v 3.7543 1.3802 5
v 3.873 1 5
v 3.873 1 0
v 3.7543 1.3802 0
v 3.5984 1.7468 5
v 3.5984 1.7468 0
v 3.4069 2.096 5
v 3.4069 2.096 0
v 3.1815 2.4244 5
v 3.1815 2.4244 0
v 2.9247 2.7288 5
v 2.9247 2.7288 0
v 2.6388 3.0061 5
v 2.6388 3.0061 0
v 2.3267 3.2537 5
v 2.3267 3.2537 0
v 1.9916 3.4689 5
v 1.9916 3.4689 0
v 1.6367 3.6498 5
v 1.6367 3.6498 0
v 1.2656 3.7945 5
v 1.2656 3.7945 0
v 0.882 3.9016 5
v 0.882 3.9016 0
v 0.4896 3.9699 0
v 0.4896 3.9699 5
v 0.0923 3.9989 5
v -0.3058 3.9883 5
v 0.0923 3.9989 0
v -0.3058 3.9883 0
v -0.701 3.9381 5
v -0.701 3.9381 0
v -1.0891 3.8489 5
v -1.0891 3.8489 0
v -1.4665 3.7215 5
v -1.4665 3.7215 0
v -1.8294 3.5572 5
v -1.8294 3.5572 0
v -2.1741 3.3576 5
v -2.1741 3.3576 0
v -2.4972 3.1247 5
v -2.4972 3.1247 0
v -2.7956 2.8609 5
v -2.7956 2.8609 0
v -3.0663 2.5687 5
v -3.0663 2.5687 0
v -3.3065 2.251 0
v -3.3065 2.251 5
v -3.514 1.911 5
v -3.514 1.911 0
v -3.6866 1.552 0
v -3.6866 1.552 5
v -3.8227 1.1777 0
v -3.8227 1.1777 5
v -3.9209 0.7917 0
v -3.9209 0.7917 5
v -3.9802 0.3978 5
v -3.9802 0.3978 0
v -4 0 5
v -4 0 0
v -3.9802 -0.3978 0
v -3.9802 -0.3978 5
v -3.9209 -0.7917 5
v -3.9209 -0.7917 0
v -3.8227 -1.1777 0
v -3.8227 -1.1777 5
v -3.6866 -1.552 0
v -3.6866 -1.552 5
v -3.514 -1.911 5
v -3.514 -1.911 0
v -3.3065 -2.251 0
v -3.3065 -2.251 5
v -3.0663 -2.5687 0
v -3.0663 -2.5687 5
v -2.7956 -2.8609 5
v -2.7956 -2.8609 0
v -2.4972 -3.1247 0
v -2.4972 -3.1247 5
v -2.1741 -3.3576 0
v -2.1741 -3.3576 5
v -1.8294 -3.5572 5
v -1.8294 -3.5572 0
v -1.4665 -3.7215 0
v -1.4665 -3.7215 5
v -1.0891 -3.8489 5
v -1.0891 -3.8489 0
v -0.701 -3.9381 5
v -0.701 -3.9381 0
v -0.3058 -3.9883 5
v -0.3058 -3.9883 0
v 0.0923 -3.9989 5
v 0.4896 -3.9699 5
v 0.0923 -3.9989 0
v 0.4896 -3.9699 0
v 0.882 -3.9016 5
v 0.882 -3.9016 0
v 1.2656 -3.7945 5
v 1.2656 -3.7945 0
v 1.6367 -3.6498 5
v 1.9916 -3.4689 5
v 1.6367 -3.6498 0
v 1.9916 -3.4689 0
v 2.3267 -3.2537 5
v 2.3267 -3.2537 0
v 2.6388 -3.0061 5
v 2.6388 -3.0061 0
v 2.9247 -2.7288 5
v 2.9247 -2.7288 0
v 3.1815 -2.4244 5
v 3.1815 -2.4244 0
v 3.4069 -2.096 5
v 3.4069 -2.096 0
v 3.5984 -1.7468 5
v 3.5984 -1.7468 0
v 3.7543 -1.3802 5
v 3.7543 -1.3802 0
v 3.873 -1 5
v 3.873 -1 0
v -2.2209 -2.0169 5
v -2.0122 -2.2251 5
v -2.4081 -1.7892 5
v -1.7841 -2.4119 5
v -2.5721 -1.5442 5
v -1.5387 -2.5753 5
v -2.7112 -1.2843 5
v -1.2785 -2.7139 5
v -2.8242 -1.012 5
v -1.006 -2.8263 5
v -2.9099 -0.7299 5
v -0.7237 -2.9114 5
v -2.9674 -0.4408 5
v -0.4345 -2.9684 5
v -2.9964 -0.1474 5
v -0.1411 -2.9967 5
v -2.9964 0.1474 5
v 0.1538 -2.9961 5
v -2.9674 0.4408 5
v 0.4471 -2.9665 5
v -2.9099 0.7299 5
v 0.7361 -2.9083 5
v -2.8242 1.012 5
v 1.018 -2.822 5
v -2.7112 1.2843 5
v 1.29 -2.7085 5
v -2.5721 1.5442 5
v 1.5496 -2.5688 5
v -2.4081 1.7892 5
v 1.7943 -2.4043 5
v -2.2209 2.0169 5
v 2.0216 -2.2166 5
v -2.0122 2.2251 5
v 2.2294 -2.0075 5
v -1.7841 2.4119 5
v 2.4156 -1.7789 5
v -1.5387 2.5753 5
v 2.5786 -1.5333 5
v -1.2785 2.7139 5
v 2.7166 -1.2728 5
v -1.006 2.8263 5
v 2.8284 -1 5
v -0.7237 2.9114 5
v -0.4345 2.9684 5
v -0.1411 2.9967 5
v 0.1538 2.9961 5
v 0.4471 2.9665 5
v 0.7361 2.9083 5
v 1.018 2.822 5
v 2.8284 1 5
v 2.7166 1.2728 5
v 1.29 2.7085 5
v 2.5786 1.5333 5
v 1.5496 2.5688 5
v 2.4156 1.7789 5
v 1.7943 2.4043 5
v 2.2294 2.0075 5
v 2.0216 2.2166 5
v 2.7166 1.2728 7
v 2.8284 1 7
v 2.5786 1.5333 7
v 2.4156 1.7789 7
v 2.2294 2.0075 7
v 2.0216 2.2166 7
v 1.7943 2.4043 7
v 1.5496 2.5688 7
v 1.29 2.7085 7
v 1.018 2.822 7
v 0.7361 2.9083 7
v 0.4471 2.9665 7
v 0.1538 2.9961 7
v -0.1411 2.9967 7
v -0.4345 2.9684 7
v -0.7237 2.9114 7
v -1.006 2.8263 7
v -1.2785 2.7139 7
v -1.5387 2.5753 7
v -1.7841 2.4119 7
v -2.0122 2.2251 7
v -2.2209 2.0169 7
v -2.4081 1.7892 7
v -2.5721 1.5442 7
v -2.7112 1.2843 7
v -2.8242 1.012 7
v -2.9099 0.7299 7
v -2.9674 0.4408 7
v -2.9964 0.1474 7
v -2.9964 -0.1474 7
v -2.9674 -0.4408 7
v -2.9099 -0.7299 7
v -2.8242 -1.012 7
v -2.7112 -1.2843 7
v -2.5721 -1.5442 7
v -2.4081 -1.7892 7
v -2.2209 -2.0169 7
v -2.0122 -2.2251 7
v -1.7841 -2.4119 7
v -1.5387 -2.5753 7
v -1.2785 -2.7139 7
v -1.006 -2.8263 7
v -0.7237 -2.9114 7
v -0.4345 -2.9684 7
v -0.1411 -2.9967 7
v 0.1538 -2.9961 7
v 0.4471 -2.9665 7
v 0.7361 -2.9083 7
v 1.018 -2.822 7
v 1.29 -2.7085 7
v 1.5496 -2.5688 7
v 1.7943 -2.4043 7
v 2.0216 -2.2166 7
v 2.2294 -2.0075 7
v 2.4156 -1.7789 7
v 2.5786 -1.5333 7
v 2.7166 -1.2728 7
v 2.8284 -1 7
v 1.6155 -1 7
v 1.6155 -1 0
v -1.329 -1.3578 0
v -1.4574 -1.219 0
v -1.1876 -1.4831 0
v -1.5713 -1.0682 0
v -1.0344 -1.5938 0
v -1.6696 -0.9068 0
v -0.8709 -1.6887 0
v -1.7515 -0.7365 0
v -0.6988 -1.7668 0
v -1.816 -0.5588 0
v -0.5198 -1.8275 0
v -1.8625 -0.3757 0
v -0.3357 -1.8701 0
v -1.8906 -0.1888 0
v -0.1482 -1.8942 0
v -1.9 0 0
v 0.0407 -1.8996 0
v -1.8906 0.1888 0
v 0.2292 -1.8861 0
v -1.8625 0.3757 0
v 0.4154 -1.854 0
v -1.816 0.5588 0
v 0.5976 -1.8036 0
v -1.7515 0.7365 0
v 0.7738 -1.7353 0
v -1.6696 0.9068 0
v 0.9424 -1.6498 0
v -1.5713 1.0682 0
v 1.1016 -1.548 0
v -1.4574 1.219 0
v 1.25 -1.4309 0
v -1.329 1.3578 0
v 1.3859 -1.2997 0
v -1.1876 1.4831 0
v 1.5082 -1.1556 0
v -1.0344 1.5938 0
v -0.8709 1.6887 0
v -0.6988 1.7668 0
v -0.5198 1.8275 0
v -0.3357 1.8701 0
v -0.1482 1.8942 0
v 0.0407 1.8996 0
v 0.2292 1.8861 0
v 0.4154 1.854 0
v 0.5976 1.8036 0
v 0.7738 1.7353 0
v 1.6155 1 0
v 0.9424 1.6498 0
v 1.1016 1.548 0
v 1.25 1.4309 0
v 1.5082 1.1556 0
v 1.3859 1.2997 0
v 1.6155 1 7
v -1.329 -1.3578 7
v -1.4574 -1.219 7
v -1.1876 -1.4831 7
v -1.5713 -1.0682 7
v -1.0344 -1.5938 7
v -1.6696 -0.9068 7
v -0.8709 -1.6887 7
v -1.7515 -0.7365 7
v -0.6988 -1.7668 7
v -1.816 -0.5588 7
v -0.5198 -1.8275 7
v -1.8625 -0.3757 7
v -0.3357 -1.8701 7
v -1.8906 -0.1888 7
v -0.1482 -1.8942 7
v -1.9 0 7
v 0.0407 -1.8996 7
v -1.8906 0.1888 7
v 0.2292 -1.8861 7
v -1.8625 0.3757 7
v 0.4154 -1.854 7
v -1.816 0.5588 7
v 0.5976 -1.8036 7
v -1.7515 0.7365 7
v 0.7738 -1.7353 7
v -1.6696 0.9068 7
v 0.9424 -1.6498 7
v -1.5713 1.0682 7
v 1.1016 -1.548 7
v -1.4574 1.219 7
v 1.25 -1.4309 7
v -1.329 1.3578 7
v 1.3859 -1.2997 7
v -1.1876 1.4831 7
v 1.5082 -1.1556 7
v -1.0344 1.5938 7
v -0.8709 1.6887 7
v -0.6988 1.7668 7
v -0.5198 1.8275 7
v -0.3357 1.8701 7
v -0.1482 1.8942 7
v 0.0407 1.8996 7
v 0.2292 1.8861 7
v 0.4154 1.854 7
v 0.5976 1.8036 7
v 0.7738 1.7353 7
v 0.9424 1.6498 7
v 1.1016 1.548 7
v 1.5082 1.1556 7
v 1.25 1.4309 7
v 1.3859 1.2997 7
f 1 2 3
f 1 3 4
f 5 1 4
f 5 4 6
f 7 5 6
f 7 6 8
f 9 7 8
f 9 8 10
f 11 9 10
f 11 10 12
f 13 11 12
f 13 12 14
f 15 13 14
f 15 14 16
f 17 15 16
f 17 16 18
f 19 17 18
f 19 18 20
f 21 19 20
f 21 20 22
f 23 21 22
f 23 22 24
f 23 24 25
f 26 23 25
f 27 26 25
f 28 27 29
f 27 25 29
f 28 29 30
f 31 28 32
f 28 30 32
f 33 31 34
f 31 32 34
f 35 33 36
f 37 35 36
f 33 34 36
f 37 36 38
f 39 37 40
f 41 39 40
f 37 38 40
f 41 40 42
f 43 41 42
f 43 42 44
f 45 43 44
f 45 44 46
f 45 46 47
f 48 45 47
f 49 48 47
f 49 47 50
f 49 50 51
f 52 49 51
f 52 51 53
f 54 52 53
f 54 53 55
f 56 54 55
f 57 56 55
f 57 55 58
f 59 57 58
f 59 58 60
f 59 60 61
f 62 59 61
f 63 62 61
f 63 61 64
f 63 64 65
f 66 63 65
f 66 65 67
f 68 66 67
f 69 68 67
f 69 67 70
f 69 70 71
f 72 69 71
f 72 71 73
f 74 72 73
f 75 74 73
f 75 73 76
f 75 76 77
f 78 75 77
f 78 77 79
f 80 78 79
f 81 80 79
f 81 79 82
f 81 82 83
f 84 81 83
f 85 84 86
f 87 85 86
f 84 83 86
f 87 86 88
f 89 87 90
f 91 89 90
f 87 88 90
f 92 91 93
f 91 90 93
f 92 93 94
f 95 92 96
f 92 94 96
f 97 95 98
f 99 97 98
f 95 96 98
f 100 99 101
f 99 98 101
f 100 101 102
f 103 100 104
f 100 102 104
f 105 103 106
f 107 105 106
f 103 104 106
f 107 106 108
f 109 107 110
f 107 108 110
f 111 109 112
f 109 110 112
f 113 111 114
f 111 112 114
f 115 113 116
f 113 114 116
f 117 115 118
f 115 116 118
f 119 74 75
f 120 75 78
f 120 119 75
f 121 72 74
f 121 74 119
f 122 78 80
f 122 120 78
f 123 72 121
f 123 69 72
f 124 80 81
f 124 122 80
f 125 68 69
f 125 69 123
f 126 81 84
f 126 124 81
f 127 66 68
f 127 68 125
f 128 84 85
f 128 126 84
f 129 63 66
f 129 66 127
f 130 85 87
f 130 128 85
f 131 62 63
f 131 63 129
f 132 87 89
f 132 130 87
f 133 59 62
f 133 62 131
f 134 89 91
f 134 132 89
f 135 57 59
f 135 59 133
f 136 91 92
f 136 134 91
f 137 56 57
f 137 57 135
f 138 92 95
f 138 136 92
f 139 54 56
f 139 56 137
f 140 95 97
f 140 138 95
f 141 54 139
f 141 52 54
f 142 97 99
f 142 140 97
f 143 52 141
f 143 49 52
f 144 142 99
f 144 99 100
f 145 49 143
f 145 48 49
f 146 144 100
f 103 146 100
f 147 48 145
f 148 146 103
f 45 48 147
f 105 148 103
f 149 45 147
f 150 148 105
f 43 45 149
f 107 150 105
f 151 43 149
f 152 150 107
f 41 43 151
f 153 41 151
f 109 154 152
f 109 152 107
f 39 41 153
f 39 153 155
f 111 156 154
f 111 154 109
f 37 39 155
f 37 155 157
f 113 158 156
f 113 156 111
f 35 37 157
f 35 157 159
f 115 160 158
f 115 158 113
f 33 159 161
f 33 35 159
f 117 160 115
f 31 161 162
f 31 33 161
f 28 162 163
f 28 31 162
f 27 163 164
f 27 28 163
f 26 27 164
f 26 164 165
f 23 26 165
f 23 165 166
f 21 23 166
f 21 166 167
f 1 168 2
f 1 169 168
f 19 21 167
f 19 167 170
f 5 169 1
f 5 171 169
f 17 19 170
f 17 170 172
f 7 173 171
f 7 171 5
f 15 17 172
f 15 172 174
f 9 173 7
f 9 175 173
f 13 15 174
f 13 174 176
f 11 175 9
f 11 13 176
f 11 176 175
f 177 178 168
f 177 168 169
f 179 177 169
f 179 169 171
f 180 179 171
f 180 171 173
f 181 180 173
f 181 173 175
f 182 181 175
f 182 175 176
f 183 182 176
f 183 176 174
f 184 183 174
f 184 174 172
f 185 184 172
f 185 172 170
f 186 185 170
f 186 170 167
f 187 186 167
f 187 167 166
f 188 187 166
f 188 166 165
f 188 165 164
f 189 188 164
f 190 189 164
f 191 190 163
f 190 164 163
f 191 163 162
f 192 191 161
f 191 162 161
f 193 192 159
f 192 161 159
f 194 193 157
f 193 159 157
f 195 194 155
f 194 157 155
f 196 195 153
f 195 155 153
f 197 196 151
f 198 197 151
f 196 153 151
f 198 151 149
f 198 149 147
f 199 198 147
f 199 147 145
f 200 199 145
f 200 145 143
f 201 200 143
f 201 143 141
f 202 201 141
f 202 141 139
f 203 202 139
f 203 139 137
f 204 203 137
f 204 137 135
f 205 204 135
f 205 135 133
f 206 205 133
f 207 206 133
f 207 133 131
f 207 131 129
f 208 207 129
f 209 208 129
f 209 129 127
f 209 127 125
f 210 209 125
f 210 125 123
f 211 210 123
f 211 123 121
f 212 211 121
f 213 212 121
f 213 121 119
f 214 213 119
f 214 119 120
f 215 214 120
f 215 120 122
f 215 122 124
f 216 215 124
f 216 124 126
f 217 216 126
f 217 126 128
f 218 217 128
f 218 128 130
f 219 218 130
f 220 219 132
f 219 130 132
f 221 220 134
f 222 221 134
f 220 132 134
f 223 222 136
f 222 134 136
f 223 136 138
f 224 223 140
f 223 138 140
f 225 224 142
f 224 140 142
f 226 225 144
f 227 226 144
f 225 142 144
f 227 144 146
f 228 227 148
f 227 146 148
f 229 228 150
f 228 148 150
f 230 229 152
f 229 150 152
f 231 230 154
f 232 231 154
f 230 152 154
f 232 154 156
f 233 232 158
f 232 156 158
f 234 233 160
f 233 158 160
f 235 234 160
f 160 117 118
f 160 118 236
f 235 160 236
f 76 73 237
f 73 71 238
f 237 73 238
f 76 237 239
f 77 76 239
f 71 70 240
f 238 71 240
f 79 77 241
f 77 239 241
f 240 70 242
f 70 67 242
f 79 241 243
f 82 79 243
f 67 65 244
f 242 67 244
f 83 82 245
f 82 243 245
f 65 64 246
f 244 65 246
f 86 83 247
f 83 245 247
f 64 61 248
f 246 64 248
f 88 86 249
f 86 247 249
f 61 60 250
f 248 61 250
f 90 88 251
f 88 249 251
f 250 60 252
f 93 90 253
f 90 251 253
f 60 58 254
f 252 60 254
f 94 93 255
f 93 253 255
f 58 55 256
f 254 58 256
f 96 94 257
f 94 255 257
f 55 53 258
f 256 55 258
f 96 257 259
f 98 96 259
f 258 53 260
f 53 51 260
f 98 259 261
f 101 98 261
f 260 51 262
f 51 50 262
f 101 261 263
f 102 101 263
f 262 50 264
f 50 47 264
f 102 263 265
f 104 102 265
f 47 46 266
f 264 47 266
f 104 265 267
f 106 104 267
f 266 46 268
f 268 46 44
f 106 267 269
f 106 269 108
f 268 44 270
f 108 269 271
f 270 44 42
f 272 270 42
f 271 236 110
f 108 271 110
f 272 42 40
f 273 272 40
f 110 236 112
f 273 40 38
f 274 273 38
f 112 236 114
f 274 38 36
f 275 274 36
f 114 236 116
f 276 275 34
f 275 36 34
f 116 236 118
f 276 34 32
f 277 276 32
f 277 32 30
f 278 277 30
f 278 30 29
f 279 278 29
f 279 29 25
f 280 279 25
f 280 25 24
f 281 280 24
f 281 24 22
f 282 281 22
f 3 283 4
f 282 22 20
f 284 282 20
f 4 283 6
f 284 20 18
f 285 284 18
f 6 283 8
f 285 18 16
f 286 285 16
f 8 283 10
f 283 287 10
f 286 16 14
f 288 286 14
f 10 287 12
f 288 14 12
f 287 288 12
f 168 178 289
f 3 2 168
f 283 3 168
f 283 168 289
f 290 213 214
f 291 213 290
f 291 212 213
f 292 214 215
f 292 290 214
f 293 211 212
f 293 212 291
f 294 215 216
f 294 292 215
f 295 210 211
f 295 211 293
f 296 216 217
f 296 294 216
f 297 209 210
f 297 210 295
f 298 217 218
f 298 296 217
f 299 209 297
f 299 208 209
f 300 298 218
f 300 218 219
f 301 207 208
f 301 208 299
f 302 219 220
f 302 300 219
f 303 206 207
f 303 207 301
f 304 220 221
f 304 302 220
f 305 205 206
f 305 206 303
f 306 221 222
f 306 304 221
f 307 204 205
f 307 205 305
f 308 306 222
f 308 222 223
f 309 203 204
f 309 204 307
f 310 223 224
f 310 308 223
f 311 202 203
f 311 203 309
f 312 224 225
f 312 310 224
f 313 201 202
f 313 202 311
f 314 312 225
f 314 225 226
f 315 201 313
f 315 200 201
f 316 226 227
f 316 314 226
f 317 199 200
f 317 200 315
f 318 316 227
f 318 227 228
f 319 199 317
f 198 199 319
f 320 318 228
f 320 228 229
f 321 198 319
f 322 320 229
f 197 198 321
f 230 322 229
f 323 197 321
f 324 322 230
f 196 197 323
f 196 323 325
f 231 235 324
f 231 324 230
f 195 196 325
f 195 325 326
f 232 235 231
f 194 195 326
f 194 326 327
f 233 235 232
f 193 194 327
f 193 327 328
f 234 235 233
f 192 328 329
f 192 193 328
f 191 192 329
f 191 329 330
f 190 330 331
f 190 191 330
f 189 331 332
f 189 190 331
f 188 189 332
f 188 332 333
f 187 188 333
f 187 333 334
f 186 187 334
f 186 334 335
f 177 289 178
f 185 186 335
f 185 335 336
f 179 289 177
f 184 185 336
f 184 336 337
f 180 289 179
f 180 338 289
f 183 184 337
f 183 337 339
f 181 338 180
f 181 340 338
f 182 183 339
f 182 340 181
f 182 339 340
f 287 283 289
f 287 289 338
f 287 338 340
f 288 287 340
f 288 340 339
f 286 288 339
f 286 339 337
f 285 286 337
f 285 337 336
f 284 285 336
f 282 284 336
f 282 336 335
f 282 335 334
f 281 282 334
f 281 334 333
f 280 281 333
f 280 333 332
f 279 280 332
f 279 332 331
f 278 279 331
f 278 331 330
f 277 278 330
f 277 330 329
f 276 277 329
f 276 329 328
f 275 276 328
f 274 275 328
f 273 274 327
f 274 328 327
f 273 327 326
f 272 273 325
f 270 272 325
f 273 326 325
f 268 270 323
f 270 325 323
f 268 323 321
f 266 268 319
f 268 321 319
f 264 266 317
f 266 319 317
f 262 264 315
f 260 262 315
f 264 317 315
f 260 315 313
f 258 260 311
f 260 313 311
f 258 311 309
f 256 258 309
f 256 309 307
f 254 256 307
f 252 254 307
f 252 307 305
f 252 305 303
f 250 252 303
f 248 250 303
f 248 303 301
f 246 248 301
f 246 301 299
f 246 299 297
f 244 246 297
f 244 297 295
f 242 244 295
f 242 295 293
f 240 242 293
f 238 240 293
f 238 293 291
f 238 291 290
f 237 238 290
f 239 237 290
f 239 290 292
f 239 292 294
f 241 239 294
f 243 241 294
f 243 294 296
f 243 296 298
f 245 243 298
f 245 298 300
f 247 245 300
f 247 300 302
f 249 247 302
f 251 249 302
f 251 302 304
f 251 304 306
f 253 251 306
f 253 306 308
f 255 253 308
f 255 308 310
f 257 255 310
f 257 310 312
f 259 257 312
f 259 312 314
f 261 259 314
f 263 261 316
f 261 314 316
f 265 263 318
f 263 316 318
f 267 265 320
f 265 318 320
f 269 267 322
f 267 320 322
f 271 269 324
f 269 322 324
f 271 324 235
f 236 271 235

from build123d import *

# Parameters (mm, degrees)
SKETCH_1_R          = 4
EXTRUDE_1_DEPTH     = 5
SKETCH_2_R          = 3
EXTRUDE_2_DEPTH     = 2
SKETCH_3_R          = 1.9
CUT_EXTRUDE_1_DEPTH = 10
CUT_EXTRUDE_2_DEPTH = 1


with BuildPart() as part:
    # 草图1 → 凸台-拉伸1 (new body)
    with BuildSketch(Plane.XY):
        Circle(SKETCH_1_R)
    extrude(amount=EXTRUDE_1_DEPTH)

    # 草图2 → 凸台-拉伸2 (add)
    with BuildSketch(Plane.XY.offset(5)):
        Circle(SKETCH_2_R)
    extrude(amount=EXTRUDE_2_DEPTH)

    # 草图3 → 切除-拉伸1 (cut, through all)
    with BuildSketch(Plane.XY.offset(7)):
        Circle(SKETCH_3_R)
    extrude(amount=-CUT_EXTRUDE_1_DEPTH, mode=Mode.SUBTRACT)

    # 草图4 → 切除-拉伸2 (cut, symmetric)
    with BuildSketch(Plane(origin=(0, 0, 0), x_dir=(1, 0, 0), z_dir=(0, 1, 0))):
        Polygon((0, 0), (4, 0), (4, -5), (3, -5), (3, -7), (0, -7), align=None)
    extrude(amount=CUT_EXTRUDE_2_DEPTH, both=True, mode=Mode.SUBTRACT)


solid = part.part
